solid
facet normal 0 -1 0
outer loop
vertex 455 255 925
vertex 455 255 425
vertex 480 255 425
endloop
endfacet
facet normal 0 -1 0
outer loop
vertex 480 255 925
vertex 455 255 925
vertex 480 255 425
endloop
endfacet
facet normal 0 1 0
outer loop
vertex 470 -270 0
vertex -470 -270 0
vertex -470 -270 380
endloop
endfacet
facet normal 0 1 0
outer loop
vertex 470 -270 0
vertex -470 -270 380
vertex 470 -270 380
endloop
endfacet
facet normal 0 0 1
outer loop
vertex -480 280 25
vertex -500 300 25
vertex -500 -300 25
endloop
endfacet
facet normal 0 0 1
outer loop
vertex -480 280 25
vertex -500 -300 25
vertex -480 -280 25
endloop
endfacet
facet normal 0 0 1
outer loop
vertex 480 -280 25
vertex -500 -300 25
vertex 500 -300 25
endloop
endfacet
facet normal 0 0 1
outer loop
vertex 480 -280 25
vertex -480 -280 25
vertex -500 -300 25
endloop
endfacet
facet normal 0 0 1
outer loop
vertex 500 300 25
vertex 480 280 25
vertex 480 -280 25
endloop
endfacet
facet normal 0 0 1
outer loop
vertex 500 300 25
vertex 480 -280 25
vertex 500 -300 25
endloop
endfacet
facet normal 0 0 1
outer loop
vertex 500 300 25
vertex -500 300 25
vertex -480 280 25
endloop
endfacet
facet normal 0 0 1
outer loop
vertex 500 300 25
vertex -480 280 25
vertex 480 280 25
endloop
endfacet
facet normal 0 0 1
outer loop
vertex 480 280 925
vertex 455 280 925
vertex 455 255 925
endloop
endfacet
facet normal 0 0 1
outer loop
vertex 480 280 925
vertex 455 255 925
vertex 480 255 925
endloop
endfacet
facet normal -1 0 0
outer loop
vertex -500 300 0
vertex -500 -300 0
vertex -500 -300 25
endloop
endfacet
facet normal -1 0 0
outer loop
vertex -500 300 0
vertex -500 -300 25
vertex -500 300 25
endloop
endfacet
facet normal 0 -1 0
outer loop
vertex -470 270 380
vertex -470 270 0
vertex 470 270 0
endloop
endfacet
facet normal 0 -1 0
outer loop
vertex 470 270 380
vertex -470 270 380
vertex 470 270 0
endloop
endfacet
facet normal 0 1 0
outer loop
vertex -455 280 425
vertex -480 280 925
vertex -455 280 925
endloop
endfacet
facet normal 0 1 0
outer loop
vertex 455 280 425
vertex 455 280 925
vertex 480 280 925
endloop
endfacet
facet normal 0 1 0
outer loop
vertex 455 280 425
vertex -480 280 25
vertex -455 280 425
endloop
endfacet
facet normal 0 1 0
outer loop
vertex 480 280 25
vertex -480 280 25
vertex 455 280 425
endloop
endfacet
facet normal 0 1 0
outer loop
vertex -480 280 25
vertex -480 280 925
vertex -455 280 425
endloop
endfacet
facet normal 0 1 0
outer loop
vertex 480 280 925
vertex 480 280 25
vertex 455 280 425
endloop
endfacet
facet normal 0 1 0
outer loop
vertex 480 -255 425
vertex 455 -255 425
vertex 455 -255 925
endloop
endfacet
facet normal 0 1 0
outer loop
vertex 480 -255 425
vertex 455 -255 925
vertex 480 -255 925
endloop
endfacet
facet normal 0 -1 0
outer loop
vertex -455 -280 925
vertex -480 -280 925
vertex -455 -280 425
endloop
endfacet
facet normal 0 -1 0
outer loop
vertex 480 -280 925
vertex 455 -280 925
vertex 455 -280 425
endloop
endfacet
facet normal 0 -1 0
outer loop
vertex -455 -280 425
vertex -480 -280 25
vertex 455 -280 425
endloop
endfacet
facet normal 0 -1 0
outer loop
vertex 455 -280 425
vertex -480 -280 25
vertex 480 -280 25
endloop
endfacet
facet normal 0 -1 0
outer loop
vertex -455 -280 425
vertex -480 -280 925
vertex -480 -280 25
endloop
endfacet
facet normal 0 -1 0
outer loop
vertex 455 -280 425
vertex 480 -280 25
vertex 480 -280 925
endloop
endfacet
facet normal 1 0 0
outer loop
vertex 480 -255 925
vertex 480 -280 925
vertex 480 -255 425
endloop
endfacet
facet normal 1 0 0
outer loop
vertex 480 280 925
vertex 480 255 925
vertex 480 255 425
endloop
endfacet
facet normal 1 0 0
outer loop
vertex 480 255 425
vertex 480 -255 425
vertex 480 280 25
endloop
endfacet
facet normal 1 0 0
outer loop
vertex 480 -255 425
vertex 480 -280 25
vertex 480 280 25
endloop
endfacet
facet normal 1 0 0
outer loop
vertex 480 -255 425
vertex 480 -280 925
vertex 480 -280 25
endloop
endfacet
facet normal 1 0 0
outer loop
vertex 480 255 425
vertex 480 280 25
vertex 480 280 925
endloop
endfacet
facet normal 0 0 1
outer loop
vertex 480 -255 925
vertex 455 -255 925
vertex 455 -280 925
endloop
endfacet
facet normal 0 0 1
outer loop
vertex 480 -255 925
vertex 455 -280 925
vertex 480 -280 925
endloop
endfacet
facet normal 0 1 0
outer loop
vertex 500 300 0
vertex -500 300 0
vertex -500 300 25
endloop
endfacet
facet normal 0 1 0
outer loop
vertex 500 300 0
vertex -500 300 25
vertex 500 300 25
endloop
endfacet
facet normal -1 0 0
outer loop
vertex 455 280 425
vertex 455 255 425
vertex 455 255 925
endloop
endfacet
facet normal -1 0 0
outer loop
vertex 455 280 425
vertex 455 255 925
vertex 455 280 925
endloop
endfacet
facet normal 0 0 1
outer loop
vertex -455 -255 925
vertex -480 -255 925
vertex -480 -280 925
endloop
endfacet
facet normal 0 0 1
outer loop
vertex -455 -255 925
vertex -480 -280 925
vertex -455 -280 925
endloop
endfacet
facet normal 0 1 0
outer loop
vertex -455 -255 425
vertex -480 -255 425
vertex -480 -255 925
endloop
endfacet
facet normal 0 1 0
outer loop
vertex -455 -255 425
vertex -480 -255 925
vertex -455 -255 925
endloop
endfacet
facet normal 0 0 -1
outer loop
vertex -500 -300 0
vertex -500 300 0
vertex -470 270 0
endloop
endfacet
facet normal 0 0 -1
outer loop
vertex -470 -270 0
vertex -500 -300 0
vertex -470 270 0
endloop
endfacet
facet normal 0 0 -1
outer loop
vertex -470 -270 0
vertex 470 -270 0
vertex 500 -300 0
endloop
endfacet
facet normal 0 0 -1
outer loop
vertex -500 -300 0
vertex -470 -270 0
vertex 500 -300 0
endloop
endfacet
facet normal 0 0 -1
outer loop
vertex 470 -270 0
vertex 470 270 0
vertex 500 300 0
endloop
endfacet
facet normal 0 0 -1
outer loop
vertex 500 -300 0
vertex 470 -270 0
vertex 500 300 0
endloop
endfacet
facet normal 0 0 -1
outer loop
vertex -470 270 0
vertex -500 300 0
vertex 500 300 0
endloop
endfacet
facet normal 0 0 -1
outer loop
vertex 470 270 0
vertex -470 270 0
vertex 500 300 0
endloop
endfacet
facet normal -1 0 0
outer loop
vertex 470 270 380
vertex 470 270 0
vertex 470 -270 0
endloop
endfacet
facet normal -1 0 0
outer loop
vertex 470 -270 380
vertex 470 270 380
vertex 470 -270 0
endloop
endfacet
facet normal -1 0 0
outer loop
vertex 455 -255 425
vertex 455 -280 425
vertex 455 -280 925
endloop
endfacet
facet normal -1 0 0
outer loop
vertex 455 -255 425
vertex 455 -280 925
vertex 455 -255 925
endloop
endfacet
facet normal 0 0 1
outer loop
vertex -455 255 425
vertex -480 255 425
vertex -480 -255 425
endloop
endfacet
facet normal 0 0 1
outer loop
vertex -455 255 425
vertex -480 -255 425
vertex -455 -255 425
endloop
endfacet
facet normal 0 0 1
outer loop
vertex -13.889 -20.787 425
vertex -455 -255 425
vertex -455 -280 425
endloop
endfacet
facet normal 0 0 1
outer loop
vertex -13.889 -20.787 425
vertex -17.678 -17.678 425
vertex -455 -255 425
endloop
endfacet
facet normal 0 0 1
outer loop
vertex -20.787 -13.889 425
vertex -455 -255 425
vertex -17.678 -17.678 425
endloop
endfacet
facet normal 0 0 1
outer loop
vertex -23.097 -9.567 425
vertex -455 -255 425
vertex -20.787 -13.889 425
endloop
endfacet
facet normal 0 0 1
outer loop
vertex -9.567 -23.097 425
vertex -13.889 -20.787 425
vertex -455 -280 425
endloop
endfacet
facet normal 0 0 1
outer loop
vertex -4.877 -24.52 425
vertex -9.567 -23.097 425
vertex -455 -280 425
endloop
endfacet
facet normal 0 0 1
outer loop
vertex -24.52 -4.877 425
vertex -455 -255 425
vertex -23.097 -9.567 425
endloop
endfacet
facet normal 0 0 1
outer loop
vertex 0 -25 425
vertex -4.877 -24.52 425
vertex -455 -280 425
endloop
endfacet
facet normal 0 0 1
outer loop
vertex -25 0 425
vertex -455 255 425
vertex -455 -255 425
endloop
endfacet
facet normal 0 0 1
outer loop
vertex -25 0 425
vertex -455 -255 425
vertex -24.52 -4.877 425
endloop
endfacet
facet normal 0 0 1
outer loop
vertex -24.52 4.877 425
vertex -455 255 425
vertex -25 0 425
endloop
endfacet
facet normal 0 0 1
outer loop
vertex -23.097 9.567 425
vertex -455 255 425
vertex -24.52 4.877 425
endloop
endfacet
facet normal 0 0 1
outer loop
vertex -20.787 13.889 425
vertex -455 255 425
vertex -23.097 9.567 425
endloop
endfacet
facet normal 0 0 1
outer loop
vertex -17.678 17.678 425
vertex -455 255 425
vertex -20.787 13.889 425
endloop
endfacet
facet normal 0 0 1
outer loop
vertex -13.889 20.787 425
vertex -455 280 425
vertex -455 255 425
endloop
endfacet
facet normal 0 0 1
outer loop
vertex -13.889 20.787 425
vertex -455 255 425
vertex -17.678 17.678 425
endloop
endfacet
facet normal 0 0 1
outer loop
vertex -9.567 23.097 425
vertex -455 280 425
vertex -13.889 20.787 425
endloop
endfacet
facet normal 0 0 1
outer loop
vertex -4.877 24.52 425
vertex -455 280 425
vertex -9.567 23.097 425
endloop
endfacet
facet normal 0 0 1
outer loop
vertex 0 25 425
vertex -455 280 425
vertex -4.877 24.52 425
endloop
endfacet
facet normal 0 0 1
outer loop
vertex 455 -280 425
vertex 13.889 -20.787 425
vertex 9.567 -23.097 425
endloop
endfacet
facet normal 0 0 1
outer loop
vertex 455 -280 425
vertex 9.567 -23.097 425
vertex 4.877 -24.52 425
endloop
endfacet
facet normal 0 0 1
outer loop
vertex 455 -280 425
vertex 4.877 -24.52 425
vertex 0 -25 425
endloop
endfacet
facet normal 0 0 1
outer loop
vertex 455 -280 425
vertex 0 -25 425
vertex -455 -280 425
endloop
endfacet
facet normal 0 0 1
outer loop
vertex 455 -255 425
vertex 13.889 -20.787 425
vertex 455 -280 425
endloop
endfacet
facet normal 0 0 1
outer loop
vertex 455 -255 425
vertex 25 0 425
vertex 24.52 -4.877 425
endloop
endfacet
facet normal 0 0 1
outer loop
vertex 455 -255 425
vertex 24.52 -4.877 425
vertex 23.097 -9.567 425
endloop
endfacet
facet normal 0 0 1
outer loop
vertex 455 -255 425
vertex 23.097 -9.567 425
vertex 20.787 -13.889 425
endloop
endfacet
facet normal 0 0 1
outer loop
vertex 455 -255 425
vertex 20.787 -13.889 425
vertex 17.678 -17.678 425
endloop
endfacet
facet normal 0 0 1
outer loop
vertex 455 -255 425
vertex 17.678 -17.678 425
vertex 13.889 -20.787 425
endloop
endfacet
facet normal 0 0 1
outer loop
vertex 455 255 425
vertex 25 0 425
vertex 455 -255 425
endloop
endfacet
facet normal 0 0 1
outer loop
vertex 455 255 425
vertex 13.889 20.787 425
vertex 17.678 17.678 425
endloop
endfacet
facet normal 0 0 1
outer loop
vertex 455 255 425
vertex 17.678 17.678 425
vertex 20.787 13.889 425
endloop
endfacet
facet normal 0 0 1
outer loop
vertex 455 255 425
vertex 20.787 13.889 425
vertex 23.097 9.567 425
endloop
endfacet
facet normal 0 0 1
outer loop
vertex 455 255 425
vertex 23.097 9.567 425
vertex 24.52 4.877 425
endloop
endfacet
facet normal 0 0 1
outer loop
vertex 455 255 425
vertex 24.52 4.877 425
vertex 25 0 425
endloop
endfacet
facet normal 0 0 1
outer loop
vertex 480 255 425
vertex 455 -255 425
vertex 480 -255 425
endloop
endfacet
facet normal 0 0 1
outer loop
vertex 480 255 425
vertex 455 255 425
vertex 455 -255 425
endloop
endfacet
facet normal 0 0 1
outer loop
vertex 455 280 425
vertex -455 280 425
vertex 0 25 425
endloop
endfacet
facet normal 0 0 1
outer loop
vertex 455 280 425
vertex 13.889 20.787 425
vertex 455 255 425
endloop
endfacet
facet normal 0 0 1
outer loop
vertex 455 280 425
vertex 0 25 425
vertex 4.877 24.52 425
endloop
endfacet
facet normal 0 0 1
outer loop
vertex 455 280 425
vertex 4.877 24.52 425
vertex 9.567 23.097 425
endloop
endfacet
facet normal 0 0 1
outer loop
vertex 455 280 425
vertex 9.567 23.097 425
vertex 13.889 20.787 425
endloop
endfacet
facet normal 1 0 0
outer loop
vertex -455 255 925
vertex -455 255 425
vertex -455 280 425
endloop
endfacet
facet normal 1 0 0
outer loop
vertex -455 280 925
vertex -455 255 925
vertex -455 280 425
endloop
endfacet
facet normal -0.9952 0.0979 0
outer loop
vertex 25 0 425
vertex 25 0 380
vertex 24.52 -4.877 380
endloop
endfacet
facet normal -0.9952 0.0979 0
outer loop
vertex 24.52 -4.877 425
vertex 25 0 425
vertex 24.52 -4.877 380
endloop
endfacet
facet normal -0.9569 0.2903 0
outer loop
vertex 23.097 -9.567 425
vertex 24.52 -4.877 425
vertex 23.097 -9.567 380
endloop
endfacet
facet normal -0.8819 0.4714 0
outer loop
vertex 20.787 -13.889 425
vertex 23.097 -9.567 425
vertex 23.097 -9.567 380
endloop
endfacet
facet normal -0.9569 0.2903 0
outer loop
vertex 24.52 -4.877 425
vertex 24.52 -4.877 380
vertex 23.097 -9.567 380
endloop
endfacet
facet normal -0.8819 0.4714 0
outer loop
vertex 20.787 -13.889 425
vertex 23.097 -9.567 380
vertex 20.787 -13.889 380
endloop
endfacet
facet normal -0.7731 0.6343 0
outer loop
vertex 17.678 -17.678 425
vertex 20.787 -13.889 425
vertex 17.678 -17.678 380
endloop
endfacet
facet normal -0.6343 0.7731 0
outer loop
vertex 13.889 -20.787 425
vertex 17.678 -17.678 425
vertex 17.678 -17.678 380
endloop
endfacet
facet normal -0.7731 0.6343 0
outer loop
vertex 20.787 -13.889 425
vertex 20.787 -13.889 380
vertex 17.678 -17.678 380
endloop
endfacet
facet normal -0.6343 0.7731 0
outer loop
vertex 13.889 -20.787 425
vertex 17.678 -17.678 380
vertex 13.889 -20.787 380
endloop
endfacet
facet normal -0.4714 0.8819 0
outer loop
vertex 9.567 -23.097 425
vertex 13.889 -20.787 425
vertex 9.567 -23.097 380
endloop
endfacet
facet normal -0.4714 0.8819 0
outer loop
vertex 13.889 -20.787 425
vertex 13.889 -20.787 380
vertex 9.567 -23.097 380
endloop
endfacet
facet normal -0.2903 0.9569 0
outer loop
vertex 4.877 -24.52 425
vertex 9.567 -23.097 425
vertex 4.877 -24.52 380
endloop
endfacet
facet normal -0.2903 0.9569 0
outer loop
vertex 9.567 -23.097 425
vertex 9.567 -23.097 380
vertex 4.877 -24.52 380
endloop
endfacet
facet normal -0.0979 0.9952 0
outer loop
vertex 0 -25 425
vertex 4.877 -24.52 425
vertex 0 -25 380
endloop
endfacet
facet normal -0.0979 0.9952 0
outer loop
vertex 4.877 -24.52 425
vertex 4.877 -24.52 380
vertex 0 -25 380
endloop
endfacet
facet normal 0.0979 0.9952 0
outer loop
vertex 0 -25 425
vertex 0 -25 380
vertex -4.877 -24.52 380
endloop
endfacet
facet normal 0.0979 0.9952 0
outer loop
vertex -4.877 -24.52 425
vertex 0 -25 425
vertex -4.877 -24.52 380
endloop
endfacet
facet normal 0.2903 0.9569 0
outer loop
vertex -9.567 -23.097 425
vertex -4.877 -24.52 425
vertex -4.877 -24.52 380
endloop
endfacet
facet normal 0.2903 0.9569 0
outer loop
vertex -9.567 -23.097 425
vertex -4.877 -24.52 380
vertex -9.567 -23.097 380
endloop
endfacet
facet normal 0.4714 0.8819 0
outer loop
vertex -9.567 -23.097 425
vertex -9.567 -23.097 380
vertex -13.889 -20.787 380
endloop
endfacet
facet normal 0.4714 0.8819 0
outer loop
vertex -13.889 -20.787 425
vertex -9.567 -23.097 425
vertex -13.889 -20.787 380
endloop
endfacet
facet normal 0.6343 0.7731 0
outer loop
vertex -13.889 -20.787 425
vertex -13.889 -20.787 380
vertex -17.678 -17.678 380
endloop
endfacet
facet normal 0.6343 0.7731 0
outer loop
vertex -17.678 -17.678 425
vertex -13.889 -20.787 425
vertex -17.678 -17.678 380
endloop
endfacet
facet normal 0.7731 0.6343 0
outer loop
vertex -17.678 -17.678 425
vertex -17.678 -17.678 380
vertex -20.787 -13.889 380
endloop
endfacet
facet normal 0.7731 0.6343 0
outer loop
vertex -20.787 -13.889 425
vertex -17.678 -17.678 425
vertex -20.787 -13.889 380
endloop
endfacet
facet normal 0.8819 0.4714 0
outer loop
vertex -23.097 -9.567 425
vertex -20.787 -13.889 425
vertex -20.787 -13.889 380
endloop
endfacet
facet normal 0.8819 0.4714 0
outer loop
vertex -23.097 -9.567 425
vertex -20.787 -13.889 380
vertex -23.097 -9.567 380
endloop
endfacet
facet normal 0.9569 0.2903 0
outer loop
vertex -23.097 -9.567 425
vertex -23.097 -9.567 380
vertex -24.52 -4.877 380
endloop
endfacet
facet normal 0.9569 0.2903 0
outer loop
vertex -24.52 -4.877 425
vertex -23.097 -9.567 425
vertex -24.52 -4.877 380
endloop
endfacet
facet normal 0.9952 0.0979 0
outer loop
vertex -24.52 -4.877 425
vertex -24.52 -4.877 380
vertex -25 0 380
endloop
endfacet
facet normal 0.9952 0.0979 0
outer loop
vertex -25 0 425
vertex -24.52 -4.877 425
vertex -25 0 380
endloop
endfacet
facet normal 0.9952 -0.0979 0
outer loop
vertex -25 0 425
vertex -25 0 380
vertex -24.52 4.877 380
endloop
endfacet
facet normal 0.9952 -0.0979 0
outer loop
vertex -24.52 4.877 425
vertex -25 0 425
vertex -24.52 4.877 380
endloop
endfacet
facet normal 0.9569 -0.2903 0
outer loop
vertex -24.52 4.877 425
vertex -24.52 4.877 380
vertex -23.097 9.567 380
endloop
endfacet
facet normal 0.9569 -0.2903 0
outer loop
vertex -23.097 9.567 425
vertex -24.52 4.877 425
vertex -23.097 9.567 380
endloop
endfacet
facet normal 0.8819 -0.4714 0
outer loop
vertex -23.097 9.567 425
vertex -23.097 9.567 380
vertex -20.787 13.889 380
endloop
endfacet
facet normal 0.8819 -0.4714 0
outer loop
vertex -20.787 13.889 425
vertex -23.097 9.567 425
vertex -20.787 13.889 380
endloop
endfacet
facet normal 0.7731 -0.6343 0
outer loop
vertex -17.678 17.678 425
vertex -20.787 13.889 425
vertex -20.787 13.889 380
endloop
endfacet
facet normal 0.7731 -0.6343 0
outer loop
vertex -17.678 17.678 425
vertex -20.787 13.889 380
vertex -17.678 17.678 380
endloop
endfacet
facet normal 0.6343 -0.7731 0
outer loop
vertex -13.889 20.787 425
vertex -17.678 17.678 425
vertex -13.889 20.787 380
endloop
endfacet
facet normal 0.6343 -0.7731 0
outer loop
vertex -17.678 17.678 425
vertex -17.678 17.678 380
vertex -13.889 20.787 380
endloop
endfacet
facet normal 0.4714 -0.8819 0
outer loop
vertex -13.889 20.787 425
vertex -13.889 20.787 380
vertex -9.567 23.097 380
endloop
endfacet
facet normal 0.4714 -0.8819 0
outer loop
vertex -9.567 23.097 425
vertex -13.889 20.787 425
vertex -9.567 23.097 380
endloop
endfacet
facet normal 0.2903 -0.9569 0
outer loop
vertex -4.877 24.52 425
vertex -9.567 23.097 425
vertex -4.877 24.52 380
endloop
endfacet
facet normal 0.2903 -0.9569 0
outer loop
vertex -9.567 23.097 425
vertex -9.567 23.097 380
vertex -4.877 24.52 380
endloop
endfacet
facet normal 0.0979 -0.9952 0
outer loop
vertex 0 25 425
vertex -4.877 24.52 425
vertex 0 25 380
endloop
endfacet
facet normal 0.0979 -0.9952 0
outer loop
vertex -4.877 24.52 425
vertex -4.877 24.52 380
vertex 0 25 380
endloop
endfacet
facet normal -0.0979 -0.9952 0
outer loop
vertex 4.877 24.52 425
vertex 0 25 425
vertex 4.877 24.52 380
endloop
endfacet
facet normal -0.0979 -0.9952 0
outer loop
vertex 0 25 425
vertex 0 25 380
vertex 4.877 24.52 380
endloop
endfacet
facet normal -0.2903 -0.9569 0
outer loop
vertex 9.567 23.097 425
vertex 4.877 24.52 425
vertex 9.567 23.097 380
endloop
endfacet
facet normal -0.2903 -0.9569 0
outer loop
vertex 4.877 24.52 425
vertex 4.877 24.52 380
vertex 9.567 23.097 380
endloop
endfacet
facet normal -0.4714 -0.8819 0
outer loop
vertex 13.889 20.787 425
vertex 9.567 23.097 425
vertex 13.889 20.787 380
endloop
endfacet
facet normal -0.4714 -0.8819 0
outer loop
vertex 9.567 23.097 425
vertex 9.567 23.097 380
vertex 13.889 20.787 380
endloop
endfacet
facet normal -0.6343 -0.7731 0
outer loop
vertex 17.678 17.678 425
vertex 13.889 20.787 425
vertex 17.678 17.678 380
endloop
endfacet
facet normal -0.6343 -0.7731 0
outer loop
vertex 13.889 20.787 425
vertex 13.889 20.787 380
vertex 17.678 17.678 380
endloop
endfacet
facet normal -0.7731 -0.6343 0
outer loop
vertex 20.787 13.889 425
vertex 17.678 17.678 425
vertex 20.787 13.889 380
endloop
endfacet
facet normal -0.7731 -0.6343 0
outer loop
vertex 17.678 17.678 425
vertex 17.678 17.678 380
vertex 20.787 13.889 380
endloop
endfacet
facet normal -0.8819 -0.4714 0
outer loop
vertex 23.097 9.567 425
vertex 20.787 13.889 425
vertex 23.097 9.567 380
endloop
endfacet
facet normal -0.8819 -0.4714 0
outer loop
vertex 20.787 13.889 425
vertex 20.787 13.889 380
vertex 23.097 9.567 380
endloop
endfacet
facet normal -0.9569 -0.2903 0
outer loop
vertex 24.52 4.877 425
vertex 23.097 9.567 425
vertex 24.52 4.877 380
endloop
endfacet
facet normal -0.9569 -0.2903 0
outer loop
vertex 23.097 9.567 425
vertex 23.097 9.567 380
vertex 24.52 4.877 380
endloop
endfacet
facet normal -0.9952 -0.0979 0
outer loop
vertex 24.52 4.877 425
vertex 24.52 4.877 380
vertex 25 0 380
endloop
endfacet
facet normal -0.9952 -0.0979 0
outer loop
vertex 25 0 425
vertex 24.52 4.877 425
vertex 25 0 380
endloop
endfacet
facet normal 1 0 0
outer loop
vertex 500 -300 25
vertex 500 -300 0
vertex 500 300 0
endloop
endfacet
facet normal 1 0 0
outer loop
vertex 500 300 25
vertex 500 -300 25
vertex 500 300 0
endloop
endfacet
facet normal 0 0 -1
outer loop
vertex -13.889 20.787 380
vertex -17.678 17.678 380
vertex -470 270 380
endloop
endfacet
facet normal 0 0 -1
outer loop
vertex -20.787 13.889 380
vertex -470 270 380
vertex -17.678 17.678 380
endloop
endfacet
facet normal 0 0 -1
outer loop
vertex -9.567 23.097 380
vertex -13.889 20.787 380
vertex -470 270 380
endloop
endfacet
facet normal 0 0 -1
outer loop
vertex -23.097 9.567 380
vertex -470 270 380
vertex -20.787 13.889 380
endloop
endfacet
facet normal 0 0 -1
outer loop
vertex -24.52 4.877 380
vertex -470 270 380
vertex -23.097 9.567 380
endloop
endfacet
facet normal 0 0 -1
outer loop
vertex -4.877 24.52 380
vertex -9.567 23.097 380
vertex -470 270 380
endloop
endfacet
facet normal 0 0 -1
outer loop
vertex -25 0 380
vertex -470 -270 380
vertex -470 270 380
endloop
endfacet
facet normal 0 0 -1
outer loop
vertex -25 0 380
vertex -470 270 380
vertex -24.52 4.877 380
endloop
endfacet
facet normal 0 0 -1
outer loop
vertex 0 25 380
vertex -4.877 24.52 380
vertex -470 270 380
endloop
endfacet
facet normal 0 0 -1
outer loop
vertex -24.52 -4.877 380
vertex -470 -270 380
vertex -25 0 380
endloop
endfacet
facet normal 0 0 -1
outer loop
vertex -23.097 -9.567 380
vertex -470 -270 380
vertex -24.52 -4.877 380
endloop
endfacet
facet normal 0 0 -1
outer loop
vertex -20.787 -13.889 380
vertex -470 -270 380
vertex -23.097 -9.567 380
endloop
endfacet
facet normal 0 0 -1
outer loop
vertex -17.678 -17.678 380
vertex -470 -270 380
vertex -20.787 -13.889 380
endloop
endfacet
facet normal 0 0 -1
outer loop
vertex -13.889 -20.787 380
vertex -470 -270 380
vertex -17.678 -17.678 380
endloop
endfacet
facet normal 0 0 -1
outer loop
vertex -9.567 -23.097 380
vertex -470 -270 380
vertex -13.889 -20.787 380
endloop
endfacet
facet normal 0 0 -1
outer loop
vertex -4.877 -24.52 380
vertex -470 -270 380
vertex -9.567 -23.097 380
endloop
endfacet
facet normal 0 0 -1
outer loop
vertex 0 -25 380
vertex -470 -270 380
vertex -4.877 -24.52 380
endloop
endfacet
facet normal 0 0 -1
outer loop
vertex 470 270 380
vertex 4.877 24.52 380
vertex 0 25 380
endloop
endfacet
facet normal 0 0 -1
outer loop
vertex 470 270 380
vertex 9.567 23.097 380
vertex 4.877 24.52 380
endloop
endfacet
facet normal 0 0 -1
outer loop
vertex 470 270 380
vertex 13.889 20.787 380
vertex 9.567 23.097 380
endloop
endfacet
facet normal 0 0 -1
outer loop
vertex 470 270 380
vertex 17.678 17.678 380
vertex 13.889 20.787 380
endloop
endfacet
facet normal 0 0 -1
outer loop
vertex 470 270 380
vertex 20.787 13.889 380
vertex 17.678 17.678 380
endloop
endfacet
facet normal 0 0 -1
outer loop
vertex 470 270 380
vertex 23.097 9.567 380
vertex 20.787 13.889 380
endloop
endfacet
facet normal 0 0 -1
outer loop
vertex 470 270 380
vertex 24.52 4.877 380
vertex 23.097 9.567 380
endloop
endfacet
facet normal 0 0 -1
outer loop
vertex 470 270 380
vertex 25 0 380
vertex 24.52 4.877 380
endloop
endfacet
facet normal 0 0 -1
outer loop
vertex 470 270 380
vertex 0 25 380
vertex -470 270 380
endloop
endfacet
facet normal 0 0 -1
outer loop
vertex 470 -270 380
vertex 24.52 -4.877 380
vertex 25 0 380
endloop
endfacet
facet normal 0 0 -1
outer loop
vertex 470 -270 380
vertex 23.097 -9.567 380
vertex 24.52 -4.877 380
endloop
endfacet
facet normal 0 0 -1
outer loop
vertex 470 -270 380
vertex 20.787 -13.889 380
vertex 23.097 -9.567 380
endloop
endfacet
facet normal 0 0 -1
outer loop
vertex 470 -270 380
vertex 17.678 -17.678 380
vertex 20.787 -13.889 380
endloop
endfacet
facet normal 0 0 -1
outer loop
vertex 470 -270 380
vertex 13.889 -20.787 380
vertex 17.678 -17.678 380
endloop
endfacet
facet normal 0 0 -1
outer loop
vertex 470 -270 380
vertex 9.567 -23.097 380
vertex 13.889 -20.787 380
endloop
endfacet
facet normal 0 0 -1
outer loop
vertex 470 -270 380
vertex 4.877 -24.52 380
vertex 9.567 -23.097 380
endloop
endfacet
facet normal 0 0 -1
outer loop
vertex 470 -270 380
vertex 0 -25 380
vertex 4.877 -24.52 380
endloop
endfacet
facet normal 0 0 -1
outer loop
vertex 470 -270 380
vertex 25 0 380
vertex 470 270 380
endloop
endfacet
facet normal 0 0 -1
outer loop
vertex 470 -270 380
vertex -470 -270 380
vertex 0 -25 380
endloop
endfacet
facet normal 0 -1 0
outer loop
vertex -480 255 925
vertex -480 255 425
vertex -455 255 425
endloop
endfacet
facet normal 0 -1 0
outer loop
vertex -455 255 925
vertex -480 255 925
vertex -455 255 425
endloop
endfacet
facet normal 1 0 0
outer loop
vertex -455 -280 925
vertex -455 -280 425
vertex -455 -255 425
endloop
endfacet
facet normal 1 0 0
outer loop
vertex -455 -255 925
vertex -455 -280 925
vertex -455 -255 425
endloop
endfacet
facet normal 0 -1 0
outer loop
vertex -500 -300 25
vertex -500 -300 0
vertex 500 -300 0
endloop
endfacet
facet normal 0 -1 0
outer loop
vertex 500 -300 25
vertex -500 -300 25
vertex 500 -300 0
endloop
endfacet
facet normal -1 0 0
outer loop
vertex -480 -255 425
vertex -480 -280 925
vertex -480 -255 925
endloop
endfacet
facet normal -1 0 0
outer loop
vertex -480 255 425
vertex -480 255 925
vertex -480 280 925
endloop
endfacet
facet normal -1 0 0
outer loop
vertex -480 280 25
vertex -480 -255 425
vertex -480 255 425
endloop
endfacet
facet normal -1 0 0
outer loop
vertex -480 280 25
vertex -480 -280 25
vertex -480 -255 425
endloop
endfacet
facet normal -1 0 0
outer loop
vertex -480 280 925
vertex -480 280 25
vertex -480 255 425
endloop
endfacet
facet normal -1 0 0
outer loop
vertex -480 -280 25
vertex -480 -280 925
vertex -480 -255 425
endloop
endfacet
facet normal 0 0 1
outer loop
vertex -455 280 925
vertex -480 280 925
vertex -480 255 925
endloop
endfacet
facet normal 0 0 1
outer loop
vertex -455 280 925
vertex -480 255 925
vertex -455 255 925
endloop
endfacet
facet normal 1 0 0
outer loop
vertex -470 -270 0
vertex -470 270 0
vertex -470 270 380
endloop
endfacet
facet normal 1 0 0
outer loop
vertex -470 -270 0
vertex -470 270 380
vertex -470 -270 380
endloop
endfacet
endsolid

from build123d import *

# Parameters (mm, degrees)
F0_W     = 1000
F0_H     = 600
F1_DEPTH = 25
F2_W     = 960
F2_H     = 560
F3_DEPTH = 400
F4_W     = 940
F4_H     = 540
F5_DEPTH = 380
F6_W     = 25
F6_H     = 25
F7_DEPTH = 500
F8_R     = 25
F9_DEPTH = 100


with BuildPart() as f1:
    # F0 (on Top) → F1 (new body)
    with BuildSketch(Plane.XY):
        Rectangle(F0_W, F0_H)
    extrude(amount=F1_DEPTH)

    # F2 (on face) → F3 (join)
    with BuildSketch(Plane.XY.offset(25)):
        Rectangle(F2_W, F2_H)
    extrude(amount=F3_DEPTH)

    # F4 (on face) → F5 (cut)
    with BuildSketch(Plane(origin=(0, 0, 0), x_dir=(1, 0, 0), z_dir=(0, 0, -1))):
        Rectangle(F4_W, F4_H)
    extrude(amount=-F5_DEPTH, mode=Mode.SUBTRACT)

    # F6 (on face) → F7 (join)
    with BuildSketch(Plane.XY.offset(425)):
        with Locations((-467.5, 267.5)):
            Rectangle(F6_W, F6_H)
        with Locations((-467.5, -267.5)):
            Rectangle(F6_W, F6_H)
        with Locations((467.5, -267.5)):
            Rectangle(F6_W, F6_H)
        with Locations((467.5, 267.5)):
            Rectangle(F6_W, F6_H)
    extrude(amount=F7_DEPTH)

    # F8 (on face) → F9 (cut)
    with BuildSketch(Plane(origin=(0, 0, 380), x_dir=(1, 0, 0), z_dir=(0, 0, -1))):
        Circle(F8_R)
    extrude(amount=-F9_DEPTH, mode=Mode.SUBTRACT)


solid = f1.part
